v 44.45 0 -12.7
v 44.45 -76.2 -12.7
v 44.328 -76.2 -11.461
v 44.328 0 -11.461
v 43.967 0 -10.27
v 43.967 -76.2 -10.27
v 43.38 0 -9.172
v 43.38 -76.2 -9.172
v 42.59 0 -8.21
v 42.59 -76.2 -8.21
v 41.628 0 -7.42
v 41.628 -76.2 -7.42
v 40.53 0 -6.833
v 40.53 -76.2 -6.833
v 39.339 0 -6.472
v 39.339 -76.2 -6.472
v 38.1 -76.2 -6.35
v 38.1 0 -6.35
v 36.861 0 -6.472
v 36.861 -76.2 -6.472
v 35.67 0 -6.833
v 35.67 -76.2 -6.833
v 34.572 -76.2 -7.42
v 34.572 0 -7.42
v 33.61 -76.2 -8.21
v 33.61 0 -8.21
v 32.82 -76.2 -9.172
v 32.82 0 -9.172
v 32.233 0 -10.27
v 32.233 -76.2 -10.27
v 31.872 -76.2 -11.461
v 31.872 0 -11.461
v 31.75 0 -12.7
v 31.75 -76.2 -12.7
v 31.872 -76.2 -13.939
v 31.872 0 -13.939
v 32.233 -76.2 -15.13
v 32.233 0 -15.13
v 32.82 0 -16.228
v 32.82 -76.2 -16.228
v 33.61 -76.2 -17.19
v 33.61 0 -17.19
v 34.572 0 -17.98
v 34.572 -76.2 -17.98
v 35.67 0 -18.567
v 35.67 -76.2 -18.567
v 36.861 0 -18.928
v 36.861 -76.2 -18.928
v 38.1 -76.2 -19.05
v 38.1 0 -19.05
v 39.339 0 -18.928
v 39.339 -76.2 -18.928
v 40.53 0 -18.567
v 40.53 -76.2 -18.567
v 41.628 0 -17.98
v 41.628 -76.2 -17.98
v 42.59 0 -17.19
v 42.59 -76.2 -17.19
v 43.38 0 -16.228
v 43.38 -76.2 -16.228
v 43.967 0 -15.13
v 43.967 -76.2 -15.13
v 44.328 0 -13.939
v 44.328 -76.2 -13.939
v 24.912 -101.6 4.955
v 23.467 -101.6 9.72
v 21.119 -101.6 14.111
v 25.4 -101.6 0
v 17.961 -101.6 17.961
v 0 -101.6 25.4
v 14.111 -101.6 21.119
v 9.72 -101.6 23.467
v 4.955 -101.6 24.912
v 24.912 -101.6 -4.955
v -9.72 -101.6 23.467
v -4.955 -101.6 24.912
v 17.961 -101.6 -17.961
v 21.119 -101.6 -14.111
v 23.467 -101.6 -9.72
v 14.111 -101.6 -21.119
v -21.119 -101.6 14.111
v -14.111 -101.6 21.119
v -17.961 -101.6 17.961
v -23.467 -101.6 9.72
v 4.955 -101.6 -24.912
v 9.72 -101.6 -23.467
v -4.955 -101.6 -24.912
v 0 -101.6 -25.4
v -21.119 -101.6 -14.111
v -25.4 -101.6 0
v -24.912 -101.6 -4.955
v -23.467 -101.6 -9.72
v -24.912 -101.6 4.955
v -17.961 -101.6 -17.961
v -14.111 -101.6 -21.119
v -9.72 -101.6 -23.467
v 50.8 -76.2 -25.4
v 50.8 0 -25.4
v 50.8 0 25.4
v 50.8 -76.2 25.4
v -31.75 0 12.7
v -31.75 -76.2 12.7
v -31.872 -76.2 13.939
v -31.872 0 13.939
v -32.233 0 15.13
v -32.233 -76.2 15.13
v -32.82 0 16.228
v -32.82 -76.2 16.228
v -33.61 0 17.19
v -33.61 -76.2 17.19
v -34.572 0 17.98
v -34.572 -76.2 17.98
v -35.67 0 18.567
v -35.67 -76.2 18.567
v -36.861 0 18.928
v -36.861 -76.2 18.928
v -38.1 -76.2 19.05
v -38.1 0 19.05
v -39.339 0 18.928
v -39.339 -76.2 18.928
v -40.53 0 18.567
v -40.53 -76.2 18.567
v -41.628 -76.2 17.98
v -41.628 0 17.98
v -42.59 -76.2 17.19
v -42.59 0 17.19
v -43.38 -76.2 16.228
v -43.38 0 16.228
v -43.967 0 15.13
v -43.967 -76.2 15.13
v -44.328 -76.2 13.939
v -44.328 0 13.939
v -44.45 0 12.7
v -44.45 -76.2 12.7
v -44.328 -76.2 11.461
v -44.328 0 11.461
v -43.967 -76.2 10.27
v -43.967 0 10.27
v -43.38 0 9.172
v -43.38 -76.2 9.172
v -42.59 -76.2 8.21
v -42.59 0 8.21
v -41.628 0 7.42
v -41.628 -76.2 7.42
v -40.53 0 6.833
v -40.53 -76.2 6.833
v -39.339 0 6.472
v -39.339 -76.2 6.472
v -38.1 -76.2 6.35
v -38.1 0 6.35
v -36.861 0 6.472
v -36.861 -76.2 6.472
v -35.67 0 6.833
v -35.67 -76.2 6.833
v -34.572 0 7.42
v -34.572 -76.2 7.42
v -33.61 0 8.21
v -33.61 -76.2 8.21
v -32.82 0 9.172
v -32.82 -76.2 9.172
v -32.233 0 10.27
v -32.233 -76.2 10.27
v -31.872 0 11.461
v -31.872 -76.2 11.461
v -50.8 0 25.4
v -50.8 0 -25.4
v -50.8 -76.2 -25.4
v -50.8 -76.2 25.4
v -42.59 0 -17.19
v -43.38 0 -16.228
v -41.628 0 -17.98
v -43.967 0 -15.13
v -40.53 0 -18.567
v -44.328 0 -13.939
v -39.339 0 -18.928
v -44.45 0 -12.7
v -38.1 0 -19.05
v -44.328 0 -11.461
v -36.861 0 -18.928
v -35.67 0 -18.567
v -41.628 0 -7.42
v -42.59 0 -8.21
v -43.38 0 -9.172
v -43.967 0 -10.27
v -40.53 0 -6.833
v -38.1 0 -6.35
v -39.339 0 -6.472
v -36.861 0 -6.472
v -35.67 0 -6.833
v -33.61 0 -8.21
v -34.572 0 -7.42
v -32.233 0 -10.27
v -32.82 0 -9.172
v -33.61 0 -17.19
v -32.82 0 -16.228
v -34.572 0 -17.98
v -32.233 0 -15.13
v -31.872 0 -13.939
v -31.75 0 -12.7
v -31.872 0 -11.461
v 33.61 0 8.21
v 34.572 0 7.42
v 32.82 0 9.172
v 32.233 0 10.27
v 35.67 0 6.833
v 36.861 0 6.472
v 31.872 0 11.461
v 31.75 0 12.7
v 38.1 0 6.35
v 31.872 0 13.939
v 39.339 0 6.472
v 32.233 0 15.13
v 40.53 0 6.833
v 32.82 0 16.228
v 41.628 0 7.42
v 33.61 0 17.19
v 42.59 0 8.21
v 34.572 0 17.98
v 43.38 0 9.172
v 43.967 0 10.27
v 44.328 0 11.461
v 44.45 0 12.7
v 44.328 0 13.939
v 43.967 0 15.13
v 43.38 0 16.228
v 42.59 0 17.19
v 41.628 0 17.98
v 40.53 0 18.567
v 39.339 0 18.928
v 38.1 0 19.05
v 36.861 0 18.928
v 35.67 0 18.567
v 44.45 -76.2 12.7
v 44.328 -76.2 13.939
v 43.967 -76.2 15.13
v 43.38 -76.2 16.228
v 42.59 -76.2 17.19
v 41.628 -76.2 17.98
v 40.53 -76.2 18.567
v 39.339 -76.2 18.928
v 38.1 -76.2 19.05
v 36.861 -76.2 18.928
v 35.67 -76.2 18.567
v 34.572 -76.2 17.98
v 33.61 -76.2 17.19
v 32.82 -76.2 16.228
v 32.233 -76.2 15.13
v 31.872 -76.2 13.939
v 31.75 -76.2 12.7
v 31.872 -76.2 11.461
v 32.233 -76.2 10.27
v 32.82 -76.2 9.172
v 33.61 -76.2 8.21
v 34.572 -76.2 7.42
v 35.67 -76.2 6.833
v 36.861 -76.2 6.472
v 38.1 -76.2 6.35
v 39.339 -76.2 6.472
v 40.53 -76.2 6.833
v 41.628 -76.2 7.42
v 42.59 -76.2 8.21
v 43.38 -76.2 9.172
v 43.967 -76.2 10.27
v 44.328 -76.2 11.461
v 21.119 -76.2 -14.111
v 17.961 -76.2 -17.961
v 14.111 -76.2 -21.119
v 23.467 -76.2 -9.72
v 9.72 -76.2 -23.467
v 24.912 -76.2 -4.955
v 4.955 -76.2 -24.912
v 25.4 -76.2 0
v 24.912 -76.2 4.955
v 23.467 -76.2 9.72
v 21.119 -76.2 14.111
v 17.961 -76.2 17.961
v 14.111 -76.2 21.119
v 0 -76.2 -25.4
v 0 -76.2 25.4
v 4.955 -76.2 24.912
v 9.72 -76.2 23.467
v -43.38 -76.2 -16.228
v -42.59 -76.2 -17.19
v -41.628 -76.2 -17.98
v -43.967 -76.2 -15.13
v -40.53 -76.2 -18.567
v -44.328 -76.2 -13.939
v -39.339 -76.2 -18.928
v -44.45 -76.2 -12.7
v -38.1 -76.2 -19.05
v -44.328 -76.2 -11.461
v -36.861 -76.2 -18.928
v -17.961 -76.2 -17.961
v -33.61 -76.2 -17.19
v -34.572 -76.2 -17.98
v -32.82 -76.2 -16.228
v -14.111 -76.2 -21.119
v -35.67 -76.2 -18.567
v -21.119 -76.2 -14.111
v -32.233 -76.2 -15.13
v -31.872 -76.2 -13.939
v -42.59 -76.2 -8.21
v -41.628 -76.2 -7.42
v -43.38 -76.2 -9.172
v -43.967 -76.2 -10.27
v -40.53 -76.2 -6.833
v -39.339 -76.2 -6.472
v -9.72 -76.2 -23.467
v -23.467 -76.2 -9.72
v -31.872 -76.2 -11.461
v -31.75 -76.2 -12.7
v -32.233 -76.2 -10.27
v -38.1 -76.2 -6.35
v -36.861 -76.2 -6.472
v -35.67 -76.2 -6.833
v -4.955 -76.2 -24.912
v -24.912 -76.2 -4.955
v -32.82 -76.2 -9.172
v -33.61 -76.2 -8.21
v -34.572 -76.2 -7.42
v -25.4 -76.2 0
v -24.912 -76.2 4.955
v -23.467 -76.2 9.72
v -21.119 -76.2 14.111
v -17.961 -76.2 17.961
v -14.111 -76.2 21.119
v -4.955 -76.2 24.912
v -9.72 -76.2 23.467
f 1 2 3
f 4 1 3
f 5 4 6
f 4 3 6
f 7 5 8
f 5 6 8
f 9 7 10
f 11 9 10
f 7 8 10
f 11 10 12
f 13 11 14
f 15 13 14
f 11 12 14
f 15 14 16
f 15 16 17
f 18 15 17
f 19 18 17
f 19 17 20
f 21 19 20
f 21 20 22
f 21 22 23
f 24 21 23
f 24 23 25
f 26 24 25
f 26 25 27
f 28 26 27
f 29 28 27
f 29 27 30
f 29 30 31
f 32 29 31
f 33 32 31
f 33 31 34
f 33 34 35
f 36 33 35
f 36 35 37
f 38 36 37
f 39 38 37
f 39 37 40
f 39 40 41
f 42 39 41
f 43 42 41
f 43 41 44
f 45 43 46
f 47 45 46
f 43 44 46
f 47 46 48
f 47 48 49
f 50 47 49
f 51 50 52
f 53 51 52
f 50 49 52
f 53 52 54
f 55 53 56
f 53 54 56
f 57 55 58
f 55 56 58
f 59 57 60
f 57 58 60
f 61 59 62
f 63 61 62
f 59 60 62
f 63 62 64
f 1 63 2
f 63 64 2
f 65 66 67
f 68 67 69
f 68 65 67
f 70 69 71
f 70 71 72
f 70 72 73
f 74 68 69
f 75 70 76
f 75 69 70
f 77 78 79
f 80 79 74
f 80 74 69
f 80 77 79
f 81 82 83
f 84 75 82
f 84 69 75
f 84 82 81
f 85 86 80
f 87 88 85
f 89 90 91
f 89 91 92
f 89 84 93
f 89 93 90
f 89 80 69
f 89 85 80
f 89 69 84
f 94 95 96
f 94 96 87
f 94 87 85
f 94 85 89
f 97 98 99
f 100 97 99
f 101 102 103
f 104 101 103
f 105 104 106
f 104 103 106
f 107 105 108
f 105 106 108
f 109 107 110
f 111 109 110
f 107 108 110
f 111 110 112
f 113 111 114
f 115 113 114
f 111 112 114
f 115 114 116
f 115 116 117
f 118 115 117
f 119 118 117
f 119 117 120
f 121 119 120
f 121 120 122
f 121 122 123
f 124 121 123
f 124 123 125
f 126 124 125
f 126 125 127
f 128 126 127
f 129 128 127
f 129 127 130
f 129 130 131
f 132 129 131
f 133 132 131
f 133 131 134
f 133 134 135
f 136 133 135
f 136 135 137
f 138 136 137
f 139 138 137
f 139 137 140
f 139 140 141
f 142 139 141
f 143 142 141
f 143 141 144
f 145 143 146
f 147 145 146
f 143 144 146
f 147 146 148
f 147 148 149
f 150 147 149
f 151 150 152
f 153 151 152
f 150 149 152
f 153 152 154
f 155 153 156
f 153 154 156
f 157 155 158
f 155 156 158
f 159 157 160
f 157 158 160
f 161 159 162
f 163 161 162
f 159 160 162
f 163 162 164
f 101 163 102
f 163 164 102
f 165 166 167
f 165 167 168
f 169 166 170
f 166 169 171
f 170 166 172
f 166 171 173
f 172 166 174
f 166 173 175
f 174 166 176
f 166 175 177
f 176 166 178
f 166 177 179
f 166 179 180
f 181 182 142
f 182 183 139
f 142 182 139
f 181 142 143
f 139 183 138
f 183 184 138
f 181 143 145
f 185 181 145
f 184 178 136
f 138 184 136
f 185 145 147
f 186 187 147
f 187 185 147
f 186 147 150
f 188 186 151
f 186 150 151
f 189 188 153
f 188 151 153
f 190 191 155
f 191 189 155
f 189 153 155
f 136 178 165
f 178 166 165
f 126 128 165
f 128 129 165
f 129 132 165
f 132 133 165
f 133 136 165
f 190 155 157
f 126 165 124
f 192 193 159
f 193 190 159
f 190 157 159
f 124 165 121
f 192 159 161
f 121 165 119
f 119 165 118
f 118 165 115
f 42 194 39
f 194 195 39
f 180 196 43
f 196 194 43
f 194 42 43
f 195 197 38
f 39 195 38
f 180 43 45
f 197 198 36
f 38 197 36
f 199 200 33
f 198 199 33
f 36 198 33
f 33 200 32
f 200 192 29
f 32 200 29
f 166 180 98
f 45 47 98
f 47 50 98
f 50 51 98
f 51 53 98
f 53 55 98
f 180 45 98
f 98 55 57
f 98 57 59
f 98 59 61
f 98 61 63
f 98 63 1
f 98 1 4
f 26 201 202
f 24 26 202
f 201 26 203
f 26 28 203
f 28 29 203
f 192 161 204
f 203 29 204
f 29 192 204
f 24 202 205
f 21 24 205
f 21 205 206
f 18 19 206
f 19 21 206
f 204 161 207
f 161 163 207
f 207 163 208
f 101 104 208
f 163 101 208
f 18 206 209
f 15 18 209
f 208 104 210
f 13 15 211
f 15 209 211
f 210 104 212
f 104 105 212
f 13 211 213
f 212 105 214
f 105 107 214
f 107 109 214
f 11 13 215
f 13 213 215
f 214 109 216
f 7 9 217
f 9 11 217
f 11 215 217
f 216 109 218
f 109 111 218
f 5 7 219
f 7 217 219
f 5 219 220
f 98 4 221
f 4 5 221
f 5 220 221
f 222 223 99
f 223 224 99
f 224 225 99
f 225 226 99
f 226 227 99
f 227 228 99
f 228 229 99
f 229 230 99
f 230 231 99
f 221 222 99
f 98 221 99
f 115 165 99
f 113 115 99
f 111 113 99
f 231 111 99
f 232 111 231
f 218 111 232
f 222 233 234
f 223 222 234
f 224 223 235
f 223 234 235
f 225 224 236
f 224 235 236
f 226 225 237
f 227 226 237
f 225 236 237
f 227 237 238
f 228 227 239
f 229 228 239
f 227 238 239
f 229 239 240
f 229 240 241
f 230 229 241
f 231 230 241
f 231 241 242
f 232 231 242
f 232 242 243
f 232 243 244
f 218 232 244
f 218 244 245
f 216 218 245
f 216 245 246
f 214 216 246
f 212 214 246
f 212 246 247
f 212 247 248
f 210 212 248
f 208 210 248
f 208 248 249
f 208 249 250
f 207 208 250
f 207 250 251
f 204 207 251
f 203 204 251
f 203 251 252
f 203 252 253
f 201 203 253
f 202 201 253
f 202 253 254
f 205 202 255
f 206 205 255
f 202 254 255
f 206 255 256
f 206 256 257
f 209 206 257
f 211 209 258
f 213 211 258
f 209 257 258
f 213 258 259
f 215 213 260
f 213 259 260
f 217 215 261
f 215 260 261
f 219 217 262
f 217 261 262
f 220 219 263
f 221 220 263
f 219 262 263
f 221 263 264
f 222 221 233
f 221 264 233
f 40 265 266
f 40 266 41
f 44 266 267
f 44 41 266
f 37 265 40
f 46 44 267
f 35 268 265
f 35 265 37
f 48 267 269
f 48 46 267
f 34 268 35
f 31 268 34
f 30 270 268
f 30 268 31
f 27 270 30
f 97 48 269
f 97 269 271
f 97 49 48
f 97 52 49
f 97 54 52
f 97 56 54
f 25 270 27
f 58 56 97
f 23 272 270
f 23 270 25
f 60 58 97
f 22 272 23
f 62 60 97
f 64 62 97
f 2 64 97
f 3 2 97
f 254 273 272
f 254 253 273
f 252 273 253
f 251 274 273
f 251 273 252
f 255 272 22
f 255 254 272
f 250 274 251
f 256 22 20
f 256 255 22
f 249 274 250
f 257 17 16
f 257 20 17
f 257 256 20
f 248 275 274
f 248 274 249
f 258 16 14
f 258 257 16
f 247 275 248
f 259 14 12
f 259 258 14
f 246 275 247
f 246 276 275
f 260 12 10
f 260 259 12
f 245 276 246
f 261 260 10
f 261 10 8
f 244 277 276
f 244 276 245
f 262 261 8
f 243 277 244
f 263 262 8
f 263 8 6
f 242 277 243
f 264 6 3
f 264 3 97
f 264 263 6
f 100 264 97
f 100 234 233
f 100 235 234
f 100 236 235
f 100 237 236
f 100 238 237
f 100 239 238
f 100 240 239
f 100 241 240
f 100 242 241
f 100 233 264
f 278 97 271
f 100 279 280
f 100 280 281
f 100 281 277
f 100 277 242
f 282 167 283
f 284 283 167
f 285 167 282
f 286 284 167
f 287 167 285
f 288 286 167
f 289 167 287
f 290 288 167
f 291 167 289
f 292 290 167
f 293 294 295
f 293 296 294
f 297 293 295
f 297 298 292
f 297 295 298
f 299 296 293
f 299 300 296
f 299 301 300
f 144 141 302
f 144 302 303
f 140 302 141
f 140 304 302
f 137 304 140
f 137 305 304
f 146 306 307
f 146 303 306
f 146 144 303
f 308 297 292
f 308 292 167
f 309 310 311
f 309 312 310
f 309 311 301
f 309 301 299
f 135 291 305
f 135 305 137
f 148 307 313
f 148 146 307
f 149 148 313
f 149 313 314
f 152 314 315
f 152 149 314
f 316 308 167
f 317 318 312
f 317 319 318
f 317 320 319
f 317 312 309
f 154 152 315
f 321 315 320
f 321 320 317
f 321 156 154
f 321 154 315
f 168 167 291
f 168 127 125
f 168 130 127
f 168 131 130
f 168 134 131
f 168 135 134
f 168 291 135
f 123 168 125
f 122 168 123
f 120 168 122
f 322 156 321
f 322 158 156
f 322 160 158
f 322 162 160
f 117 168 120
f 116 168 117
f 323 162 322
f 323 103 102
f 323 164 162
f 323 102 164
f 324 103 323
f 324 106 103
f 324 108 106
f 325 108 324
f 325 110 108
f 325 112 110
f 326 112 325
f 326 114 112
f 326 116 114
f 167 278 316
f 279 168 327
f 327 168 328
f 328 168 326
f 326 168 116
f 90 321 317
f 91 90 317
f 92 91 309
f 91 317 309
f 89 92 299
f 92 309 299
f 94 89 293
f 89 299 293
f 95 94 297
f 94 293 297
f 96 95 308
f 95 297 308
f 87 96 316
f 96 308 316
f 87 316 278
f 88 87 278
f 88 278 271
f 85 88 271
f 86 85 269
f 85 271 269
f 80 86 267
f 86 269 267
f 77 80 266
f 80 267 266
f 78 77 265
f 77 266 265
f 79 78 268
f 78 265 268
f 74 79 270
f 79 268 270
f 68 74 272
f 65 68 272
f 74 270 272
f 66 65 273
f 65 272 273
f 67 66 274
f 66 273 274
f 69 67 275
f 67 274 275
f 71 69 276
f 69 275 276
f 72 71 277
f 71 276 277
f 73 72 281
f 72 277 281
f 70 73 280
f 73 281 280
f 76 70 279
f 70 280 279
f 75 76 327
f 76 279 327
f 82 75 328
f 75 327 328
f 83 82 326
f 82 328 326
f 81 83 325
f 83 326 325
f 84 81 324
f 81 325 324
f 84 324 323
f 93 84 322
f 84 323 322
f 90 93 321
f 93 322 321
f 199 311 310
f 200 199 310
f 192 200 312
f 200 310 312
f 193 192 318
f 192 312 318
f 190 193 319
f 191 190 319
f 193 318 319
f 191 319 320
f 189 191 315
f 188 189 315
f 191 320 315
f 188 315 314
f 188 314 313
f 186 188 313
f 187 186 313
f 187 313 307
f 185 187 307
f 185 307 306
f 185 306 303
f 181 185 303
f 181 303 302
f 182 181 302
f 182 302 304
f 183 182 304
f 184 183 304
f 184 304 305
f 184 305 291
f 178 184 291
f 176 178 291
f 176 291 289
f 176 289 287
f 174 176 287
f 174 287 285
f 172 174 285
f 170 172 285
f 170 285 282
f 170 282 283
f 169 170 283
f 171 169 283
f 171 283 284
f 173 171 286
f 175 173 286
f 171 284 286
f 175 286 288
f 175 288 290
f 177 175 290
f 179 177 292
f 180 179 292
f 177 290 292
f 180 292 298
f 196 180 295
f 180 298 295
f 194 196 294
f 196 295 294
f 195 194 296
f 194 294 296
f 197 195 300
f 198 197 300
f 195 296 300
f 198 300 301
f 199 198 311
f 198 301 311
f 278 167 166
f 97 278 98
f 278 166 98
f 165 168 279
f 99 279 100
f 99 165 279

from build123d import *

# Parameters (mm, degrees)
F0_W     = 101.6
F0_H     = 50.8
F1_DEPTH = 76.2
F2_R     = 6.35
F3_DEPTH = 76.201
F4_W     = 25.4
F4_H     = 25.4


with BuildPart() as f1:
    # F0 (on Front) → F1 (new body)
    with BuildSketch(Plane.XZ):
        Rectangle(F0_W, F0_H)
    extrude(amount=F1_DEPTH)

    # F2 (on face) → F3 (cut, through all)
    with BuildSketch(Plane.XZ.offset(76.2)):
        with Locations((-38.1, 12.7)):
            Circle(F2_R)
        with Locations((-38.1, -12.7)):
            Circle(F2_R)
        with Locations((38.1, -12.7)):
            Circle(F2_R)
        with Locations((38.1, 12.7)):
            Circle(F2_R)
    extrude(amount=-F3_DEPTH, mode=Mode.SUBTRACT)

    # F4 (on Top) → F5 (revolve)
    with BuildSketch(Plane.XY):
        with Locations((-12.7, -88.9)):
            Rectangle(F4_W, F4_H)
    revolve(axis=Axis((0, -54.245796, 0), (0, -1, 0)))


solid = f1.part
